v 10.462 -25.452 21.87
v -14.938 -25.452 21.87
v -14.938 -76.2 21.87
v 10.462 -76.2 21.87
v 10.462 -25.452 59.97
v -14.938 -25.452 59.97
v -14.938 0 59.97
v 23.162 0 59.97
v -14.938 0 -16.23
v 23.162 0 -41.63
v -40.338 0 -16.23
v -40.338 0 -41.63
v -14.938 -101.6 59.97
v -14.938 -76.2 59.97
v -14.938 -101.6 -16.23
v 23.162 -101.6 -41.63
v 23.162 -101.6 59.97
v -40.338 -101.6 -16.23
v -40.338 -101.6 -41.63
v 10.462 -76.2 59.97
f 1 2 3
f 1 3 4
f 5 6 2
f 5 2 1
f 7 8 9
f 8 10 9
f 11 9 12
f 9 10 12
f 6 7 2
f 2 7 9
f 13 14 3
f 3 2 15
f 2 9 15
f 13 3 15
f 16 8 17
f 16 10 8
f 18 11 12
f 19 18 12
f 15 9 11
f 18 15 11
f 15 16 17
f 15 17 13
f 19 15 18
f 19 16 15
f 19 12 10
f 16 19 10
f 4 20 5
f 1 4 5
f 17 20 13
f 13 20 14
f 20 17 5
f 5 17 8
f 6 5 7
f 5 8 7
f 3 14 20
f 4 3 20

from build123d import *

# Parameters (mm, degrees)
F1_DEPTH = 101.6
F2_DEPTH = 25.4
F3_W     = 25.4
F3_H     = 50.747624588
F4_DEPTH = 38.1


with BuildPart() as f1:
    # F0 (on Front) → F1 (new body)
    with BuildSketch(Plane.XZ):
        Polygon((-40.3379746149, -16.229630179), (-40.3379746149, -41.629630179), (23.1620253851, -41.629630179), (23.1620253851, 34.570369821), (-14.9379746149, 34.570369821), (-14.9379746149, -16.229630179), align=None)
    extrude(amount=F1_DEPTH)

    # F2 (add): a face of the model
    f2_faces = [f1.faces().sort_by_distance(p)[0] for p in [
        (4.1120253851, -50.8, 34.570369821),
    ]]
    extrude(f2_faces, amount=F2_DEPTH)

    # F3 (on face) → F4 (cut)
    with BuildSketch(Plane.XY.offset(59.970369821)):
        with Locations((-2.2379746149, -50.826187706)):
            Rectangle(F3_W, F3_H)
    extrude(amount=-F4_DEPTH, mode=Mode.SUBTRACT)


solid = f1.part
